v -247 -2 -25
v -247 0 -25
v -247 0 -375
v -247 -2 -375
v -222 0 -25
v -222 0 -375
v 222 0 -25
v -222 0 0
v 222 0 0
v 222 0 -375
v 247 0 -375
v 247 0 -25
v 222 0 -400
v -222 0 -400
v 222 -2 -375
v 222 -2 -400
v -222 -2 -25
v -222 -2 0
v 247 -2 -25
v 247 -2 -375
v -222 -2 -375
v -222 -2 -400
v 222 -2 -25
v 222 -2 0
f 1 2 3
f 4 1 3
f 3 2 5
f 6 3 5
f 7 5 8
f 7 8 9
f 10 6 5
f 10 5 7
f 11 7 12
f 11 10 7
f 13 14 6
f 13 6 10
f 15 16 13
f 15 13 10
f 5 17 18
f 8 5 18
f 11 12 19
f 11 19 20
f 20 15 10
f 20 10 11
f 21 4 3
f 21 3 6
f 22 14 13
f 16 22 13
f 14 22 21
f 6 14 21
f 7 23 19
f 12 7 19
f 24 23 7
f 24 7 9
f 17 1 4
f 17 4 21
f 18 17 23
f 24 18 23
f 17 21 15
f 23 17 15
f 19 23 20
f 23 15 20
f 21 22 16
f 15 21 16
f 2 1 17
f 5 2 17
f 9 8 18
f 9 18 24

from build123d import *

# Parameters (mm, degrees)
IZIM1_W               = 494
IZIM1_H               = 400
TABAN_FLAN_1_DEPTH    = 2
IZIM6_W               = 25
IZIM6_H               = 25
KES_EKSTR_ZYON1_DEPTH = 10


# Sheet-metal steps are written as plain solids
with BuildPart() as part:
    # Çizim1 → Taban-Flanş1 (new body)
    with BuildSketch(Plane(origin=(0, 0, 0), x_dir=(1, 0, 0), z_dir=(0, 1, 0))):
        with Locations((0, 200)):
            Rectangle(IZIM1_W, IZIM1_H)
    extrude(amount=-TABAN_FLAN_1_DEPTH)

    # Çizim6 → Kes-Ekstrüzyon1 (cut)
    with BuildSketch(Plane.XZ.offset(2)):
        with Locations((-234.5, -12.5)):
            Rectangle(IZIM6_W, IZIM6_H)
        with Locations((234.5, -12.5)):
            Rectangle(IZIM6_W, IZIM6_H)
        with Locations((234.5, -387.5)):
            Rectangle(IZIM6_W, IZIM6_H)
        with Locations((-234.5, -387.5)):
            Rectangle(IZIM6_W, IZIM6_H)
    extrude(amount=-KES_EKSTR_ZYON1_DEPTH, mode=Mode.SUBTRACT)


solid = part.part
